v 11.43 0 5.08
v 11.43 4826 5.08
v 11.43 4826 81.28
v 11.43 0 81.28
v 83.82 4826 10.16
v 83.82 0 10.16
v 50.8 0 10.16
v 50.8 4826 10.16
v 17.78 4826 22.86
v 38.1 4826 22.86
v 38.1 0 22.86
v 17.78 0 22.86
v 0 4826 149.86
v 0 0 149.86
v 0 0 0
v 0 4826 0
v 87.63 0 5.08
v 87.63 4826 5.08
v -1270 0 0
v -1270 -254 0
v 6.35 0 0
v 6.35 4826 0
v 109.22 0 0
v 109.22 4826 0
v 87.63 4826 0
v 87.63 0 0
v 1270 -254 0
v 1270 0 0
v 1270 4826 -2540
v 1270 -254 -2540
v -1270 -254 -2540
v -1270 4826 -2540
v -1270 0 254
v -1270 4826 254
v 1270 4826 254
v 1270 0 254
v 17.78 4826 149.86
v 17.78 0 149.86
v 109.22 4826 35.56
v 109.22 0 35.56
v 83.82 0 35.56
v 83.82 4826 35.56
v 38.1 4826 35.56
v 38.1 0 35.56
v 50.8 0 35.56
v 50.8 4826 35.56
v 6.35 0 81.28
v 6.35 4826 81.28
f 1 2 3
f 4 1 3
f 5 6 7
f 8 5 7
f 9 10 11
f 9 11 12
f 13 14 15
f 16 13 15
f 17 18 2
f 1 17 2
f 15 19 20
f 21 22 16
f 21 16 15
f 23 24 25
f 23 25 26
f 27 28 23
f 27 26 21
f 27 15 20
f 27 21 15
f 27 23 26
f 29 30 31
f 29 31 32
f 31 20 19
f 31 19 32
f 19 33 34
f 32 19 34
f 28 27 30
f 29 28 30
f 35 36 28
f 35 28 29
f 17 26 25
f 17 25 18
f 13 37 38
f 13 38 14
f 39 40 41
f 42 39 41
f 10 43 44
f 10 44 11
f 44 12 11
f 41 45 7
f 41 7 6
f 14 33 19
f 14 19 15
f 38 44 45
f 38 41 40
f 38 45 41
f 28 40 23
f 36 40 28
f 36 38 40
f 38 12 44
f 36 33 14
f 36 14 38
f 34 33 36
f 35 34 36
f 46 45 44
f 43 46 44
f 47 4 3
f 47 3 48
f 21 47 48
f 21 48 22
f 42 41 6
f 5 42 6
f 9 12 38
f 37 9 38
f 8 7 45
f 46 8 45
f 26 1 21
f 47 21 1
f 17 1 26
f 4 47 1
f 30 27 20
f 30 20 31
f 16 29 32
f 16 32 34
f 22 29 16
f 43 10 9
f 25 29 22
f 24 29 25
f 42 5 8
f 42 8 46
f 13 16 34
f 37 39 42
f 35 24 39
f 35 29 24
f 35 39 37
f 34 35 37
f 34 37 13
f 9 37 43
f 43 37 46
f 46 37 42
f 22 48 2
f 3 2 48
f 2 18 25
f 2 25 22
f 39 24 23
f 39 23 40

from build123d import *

# Parameters (mm, degrees)
F1_W     = 2540
F1_H     = 254
F2_DEPTH = 4826
F3_DEPTH = 4826
F5_DEPTH = 2540
F7_DEPTH = 4826


with BuildPart() as f2:
    # F1 (on Front) → F2 (new body)
    with BuildSketch(Plane.XZ):
        with Locations((0, 127)):
            Rectangle(F1_W, F1_H)
    extrude(amount=-F2_DEPTH)

    # F0 (on Front) → F3 (cut)
    with BuildSketch(Plane.XZ):
        Polygon((0, 149.86), (0, 0), (109.22, 0), (109.22, 35.56), (83.82, 35.56), (83.82, 10.16), (50.8, 10.16), (50.8, 35.56), (38.1, 35.56), (38.1, 22.86), (17.78, 22.86), (17.78, 149.86), align=None)
    extrude(amount=-F3_DEPTH, mode=Mode.SUBTRACT)

    # F4 (on face) → F5 (join)
    with BuildSketch(Plane.YZ.offset(1270)):
        Polygon((4826, -2540), (4826, 0), (0, 0), (-254, 0), (-254, -2540), align=None)
    extrude(amount=-F5_DEPTH)

    # F6 (on face) → F7 (join)
    with BuildSketch(Plane.XZ):
        Polygon((6.35, 81.28), (6.35, 0), (87.63, 0), (87.63, 5.08), (11.43, 5.08), (11.43, 81.28), align=None)
    extrude(amount=-F7_DEPTH)


solid = f2.part
